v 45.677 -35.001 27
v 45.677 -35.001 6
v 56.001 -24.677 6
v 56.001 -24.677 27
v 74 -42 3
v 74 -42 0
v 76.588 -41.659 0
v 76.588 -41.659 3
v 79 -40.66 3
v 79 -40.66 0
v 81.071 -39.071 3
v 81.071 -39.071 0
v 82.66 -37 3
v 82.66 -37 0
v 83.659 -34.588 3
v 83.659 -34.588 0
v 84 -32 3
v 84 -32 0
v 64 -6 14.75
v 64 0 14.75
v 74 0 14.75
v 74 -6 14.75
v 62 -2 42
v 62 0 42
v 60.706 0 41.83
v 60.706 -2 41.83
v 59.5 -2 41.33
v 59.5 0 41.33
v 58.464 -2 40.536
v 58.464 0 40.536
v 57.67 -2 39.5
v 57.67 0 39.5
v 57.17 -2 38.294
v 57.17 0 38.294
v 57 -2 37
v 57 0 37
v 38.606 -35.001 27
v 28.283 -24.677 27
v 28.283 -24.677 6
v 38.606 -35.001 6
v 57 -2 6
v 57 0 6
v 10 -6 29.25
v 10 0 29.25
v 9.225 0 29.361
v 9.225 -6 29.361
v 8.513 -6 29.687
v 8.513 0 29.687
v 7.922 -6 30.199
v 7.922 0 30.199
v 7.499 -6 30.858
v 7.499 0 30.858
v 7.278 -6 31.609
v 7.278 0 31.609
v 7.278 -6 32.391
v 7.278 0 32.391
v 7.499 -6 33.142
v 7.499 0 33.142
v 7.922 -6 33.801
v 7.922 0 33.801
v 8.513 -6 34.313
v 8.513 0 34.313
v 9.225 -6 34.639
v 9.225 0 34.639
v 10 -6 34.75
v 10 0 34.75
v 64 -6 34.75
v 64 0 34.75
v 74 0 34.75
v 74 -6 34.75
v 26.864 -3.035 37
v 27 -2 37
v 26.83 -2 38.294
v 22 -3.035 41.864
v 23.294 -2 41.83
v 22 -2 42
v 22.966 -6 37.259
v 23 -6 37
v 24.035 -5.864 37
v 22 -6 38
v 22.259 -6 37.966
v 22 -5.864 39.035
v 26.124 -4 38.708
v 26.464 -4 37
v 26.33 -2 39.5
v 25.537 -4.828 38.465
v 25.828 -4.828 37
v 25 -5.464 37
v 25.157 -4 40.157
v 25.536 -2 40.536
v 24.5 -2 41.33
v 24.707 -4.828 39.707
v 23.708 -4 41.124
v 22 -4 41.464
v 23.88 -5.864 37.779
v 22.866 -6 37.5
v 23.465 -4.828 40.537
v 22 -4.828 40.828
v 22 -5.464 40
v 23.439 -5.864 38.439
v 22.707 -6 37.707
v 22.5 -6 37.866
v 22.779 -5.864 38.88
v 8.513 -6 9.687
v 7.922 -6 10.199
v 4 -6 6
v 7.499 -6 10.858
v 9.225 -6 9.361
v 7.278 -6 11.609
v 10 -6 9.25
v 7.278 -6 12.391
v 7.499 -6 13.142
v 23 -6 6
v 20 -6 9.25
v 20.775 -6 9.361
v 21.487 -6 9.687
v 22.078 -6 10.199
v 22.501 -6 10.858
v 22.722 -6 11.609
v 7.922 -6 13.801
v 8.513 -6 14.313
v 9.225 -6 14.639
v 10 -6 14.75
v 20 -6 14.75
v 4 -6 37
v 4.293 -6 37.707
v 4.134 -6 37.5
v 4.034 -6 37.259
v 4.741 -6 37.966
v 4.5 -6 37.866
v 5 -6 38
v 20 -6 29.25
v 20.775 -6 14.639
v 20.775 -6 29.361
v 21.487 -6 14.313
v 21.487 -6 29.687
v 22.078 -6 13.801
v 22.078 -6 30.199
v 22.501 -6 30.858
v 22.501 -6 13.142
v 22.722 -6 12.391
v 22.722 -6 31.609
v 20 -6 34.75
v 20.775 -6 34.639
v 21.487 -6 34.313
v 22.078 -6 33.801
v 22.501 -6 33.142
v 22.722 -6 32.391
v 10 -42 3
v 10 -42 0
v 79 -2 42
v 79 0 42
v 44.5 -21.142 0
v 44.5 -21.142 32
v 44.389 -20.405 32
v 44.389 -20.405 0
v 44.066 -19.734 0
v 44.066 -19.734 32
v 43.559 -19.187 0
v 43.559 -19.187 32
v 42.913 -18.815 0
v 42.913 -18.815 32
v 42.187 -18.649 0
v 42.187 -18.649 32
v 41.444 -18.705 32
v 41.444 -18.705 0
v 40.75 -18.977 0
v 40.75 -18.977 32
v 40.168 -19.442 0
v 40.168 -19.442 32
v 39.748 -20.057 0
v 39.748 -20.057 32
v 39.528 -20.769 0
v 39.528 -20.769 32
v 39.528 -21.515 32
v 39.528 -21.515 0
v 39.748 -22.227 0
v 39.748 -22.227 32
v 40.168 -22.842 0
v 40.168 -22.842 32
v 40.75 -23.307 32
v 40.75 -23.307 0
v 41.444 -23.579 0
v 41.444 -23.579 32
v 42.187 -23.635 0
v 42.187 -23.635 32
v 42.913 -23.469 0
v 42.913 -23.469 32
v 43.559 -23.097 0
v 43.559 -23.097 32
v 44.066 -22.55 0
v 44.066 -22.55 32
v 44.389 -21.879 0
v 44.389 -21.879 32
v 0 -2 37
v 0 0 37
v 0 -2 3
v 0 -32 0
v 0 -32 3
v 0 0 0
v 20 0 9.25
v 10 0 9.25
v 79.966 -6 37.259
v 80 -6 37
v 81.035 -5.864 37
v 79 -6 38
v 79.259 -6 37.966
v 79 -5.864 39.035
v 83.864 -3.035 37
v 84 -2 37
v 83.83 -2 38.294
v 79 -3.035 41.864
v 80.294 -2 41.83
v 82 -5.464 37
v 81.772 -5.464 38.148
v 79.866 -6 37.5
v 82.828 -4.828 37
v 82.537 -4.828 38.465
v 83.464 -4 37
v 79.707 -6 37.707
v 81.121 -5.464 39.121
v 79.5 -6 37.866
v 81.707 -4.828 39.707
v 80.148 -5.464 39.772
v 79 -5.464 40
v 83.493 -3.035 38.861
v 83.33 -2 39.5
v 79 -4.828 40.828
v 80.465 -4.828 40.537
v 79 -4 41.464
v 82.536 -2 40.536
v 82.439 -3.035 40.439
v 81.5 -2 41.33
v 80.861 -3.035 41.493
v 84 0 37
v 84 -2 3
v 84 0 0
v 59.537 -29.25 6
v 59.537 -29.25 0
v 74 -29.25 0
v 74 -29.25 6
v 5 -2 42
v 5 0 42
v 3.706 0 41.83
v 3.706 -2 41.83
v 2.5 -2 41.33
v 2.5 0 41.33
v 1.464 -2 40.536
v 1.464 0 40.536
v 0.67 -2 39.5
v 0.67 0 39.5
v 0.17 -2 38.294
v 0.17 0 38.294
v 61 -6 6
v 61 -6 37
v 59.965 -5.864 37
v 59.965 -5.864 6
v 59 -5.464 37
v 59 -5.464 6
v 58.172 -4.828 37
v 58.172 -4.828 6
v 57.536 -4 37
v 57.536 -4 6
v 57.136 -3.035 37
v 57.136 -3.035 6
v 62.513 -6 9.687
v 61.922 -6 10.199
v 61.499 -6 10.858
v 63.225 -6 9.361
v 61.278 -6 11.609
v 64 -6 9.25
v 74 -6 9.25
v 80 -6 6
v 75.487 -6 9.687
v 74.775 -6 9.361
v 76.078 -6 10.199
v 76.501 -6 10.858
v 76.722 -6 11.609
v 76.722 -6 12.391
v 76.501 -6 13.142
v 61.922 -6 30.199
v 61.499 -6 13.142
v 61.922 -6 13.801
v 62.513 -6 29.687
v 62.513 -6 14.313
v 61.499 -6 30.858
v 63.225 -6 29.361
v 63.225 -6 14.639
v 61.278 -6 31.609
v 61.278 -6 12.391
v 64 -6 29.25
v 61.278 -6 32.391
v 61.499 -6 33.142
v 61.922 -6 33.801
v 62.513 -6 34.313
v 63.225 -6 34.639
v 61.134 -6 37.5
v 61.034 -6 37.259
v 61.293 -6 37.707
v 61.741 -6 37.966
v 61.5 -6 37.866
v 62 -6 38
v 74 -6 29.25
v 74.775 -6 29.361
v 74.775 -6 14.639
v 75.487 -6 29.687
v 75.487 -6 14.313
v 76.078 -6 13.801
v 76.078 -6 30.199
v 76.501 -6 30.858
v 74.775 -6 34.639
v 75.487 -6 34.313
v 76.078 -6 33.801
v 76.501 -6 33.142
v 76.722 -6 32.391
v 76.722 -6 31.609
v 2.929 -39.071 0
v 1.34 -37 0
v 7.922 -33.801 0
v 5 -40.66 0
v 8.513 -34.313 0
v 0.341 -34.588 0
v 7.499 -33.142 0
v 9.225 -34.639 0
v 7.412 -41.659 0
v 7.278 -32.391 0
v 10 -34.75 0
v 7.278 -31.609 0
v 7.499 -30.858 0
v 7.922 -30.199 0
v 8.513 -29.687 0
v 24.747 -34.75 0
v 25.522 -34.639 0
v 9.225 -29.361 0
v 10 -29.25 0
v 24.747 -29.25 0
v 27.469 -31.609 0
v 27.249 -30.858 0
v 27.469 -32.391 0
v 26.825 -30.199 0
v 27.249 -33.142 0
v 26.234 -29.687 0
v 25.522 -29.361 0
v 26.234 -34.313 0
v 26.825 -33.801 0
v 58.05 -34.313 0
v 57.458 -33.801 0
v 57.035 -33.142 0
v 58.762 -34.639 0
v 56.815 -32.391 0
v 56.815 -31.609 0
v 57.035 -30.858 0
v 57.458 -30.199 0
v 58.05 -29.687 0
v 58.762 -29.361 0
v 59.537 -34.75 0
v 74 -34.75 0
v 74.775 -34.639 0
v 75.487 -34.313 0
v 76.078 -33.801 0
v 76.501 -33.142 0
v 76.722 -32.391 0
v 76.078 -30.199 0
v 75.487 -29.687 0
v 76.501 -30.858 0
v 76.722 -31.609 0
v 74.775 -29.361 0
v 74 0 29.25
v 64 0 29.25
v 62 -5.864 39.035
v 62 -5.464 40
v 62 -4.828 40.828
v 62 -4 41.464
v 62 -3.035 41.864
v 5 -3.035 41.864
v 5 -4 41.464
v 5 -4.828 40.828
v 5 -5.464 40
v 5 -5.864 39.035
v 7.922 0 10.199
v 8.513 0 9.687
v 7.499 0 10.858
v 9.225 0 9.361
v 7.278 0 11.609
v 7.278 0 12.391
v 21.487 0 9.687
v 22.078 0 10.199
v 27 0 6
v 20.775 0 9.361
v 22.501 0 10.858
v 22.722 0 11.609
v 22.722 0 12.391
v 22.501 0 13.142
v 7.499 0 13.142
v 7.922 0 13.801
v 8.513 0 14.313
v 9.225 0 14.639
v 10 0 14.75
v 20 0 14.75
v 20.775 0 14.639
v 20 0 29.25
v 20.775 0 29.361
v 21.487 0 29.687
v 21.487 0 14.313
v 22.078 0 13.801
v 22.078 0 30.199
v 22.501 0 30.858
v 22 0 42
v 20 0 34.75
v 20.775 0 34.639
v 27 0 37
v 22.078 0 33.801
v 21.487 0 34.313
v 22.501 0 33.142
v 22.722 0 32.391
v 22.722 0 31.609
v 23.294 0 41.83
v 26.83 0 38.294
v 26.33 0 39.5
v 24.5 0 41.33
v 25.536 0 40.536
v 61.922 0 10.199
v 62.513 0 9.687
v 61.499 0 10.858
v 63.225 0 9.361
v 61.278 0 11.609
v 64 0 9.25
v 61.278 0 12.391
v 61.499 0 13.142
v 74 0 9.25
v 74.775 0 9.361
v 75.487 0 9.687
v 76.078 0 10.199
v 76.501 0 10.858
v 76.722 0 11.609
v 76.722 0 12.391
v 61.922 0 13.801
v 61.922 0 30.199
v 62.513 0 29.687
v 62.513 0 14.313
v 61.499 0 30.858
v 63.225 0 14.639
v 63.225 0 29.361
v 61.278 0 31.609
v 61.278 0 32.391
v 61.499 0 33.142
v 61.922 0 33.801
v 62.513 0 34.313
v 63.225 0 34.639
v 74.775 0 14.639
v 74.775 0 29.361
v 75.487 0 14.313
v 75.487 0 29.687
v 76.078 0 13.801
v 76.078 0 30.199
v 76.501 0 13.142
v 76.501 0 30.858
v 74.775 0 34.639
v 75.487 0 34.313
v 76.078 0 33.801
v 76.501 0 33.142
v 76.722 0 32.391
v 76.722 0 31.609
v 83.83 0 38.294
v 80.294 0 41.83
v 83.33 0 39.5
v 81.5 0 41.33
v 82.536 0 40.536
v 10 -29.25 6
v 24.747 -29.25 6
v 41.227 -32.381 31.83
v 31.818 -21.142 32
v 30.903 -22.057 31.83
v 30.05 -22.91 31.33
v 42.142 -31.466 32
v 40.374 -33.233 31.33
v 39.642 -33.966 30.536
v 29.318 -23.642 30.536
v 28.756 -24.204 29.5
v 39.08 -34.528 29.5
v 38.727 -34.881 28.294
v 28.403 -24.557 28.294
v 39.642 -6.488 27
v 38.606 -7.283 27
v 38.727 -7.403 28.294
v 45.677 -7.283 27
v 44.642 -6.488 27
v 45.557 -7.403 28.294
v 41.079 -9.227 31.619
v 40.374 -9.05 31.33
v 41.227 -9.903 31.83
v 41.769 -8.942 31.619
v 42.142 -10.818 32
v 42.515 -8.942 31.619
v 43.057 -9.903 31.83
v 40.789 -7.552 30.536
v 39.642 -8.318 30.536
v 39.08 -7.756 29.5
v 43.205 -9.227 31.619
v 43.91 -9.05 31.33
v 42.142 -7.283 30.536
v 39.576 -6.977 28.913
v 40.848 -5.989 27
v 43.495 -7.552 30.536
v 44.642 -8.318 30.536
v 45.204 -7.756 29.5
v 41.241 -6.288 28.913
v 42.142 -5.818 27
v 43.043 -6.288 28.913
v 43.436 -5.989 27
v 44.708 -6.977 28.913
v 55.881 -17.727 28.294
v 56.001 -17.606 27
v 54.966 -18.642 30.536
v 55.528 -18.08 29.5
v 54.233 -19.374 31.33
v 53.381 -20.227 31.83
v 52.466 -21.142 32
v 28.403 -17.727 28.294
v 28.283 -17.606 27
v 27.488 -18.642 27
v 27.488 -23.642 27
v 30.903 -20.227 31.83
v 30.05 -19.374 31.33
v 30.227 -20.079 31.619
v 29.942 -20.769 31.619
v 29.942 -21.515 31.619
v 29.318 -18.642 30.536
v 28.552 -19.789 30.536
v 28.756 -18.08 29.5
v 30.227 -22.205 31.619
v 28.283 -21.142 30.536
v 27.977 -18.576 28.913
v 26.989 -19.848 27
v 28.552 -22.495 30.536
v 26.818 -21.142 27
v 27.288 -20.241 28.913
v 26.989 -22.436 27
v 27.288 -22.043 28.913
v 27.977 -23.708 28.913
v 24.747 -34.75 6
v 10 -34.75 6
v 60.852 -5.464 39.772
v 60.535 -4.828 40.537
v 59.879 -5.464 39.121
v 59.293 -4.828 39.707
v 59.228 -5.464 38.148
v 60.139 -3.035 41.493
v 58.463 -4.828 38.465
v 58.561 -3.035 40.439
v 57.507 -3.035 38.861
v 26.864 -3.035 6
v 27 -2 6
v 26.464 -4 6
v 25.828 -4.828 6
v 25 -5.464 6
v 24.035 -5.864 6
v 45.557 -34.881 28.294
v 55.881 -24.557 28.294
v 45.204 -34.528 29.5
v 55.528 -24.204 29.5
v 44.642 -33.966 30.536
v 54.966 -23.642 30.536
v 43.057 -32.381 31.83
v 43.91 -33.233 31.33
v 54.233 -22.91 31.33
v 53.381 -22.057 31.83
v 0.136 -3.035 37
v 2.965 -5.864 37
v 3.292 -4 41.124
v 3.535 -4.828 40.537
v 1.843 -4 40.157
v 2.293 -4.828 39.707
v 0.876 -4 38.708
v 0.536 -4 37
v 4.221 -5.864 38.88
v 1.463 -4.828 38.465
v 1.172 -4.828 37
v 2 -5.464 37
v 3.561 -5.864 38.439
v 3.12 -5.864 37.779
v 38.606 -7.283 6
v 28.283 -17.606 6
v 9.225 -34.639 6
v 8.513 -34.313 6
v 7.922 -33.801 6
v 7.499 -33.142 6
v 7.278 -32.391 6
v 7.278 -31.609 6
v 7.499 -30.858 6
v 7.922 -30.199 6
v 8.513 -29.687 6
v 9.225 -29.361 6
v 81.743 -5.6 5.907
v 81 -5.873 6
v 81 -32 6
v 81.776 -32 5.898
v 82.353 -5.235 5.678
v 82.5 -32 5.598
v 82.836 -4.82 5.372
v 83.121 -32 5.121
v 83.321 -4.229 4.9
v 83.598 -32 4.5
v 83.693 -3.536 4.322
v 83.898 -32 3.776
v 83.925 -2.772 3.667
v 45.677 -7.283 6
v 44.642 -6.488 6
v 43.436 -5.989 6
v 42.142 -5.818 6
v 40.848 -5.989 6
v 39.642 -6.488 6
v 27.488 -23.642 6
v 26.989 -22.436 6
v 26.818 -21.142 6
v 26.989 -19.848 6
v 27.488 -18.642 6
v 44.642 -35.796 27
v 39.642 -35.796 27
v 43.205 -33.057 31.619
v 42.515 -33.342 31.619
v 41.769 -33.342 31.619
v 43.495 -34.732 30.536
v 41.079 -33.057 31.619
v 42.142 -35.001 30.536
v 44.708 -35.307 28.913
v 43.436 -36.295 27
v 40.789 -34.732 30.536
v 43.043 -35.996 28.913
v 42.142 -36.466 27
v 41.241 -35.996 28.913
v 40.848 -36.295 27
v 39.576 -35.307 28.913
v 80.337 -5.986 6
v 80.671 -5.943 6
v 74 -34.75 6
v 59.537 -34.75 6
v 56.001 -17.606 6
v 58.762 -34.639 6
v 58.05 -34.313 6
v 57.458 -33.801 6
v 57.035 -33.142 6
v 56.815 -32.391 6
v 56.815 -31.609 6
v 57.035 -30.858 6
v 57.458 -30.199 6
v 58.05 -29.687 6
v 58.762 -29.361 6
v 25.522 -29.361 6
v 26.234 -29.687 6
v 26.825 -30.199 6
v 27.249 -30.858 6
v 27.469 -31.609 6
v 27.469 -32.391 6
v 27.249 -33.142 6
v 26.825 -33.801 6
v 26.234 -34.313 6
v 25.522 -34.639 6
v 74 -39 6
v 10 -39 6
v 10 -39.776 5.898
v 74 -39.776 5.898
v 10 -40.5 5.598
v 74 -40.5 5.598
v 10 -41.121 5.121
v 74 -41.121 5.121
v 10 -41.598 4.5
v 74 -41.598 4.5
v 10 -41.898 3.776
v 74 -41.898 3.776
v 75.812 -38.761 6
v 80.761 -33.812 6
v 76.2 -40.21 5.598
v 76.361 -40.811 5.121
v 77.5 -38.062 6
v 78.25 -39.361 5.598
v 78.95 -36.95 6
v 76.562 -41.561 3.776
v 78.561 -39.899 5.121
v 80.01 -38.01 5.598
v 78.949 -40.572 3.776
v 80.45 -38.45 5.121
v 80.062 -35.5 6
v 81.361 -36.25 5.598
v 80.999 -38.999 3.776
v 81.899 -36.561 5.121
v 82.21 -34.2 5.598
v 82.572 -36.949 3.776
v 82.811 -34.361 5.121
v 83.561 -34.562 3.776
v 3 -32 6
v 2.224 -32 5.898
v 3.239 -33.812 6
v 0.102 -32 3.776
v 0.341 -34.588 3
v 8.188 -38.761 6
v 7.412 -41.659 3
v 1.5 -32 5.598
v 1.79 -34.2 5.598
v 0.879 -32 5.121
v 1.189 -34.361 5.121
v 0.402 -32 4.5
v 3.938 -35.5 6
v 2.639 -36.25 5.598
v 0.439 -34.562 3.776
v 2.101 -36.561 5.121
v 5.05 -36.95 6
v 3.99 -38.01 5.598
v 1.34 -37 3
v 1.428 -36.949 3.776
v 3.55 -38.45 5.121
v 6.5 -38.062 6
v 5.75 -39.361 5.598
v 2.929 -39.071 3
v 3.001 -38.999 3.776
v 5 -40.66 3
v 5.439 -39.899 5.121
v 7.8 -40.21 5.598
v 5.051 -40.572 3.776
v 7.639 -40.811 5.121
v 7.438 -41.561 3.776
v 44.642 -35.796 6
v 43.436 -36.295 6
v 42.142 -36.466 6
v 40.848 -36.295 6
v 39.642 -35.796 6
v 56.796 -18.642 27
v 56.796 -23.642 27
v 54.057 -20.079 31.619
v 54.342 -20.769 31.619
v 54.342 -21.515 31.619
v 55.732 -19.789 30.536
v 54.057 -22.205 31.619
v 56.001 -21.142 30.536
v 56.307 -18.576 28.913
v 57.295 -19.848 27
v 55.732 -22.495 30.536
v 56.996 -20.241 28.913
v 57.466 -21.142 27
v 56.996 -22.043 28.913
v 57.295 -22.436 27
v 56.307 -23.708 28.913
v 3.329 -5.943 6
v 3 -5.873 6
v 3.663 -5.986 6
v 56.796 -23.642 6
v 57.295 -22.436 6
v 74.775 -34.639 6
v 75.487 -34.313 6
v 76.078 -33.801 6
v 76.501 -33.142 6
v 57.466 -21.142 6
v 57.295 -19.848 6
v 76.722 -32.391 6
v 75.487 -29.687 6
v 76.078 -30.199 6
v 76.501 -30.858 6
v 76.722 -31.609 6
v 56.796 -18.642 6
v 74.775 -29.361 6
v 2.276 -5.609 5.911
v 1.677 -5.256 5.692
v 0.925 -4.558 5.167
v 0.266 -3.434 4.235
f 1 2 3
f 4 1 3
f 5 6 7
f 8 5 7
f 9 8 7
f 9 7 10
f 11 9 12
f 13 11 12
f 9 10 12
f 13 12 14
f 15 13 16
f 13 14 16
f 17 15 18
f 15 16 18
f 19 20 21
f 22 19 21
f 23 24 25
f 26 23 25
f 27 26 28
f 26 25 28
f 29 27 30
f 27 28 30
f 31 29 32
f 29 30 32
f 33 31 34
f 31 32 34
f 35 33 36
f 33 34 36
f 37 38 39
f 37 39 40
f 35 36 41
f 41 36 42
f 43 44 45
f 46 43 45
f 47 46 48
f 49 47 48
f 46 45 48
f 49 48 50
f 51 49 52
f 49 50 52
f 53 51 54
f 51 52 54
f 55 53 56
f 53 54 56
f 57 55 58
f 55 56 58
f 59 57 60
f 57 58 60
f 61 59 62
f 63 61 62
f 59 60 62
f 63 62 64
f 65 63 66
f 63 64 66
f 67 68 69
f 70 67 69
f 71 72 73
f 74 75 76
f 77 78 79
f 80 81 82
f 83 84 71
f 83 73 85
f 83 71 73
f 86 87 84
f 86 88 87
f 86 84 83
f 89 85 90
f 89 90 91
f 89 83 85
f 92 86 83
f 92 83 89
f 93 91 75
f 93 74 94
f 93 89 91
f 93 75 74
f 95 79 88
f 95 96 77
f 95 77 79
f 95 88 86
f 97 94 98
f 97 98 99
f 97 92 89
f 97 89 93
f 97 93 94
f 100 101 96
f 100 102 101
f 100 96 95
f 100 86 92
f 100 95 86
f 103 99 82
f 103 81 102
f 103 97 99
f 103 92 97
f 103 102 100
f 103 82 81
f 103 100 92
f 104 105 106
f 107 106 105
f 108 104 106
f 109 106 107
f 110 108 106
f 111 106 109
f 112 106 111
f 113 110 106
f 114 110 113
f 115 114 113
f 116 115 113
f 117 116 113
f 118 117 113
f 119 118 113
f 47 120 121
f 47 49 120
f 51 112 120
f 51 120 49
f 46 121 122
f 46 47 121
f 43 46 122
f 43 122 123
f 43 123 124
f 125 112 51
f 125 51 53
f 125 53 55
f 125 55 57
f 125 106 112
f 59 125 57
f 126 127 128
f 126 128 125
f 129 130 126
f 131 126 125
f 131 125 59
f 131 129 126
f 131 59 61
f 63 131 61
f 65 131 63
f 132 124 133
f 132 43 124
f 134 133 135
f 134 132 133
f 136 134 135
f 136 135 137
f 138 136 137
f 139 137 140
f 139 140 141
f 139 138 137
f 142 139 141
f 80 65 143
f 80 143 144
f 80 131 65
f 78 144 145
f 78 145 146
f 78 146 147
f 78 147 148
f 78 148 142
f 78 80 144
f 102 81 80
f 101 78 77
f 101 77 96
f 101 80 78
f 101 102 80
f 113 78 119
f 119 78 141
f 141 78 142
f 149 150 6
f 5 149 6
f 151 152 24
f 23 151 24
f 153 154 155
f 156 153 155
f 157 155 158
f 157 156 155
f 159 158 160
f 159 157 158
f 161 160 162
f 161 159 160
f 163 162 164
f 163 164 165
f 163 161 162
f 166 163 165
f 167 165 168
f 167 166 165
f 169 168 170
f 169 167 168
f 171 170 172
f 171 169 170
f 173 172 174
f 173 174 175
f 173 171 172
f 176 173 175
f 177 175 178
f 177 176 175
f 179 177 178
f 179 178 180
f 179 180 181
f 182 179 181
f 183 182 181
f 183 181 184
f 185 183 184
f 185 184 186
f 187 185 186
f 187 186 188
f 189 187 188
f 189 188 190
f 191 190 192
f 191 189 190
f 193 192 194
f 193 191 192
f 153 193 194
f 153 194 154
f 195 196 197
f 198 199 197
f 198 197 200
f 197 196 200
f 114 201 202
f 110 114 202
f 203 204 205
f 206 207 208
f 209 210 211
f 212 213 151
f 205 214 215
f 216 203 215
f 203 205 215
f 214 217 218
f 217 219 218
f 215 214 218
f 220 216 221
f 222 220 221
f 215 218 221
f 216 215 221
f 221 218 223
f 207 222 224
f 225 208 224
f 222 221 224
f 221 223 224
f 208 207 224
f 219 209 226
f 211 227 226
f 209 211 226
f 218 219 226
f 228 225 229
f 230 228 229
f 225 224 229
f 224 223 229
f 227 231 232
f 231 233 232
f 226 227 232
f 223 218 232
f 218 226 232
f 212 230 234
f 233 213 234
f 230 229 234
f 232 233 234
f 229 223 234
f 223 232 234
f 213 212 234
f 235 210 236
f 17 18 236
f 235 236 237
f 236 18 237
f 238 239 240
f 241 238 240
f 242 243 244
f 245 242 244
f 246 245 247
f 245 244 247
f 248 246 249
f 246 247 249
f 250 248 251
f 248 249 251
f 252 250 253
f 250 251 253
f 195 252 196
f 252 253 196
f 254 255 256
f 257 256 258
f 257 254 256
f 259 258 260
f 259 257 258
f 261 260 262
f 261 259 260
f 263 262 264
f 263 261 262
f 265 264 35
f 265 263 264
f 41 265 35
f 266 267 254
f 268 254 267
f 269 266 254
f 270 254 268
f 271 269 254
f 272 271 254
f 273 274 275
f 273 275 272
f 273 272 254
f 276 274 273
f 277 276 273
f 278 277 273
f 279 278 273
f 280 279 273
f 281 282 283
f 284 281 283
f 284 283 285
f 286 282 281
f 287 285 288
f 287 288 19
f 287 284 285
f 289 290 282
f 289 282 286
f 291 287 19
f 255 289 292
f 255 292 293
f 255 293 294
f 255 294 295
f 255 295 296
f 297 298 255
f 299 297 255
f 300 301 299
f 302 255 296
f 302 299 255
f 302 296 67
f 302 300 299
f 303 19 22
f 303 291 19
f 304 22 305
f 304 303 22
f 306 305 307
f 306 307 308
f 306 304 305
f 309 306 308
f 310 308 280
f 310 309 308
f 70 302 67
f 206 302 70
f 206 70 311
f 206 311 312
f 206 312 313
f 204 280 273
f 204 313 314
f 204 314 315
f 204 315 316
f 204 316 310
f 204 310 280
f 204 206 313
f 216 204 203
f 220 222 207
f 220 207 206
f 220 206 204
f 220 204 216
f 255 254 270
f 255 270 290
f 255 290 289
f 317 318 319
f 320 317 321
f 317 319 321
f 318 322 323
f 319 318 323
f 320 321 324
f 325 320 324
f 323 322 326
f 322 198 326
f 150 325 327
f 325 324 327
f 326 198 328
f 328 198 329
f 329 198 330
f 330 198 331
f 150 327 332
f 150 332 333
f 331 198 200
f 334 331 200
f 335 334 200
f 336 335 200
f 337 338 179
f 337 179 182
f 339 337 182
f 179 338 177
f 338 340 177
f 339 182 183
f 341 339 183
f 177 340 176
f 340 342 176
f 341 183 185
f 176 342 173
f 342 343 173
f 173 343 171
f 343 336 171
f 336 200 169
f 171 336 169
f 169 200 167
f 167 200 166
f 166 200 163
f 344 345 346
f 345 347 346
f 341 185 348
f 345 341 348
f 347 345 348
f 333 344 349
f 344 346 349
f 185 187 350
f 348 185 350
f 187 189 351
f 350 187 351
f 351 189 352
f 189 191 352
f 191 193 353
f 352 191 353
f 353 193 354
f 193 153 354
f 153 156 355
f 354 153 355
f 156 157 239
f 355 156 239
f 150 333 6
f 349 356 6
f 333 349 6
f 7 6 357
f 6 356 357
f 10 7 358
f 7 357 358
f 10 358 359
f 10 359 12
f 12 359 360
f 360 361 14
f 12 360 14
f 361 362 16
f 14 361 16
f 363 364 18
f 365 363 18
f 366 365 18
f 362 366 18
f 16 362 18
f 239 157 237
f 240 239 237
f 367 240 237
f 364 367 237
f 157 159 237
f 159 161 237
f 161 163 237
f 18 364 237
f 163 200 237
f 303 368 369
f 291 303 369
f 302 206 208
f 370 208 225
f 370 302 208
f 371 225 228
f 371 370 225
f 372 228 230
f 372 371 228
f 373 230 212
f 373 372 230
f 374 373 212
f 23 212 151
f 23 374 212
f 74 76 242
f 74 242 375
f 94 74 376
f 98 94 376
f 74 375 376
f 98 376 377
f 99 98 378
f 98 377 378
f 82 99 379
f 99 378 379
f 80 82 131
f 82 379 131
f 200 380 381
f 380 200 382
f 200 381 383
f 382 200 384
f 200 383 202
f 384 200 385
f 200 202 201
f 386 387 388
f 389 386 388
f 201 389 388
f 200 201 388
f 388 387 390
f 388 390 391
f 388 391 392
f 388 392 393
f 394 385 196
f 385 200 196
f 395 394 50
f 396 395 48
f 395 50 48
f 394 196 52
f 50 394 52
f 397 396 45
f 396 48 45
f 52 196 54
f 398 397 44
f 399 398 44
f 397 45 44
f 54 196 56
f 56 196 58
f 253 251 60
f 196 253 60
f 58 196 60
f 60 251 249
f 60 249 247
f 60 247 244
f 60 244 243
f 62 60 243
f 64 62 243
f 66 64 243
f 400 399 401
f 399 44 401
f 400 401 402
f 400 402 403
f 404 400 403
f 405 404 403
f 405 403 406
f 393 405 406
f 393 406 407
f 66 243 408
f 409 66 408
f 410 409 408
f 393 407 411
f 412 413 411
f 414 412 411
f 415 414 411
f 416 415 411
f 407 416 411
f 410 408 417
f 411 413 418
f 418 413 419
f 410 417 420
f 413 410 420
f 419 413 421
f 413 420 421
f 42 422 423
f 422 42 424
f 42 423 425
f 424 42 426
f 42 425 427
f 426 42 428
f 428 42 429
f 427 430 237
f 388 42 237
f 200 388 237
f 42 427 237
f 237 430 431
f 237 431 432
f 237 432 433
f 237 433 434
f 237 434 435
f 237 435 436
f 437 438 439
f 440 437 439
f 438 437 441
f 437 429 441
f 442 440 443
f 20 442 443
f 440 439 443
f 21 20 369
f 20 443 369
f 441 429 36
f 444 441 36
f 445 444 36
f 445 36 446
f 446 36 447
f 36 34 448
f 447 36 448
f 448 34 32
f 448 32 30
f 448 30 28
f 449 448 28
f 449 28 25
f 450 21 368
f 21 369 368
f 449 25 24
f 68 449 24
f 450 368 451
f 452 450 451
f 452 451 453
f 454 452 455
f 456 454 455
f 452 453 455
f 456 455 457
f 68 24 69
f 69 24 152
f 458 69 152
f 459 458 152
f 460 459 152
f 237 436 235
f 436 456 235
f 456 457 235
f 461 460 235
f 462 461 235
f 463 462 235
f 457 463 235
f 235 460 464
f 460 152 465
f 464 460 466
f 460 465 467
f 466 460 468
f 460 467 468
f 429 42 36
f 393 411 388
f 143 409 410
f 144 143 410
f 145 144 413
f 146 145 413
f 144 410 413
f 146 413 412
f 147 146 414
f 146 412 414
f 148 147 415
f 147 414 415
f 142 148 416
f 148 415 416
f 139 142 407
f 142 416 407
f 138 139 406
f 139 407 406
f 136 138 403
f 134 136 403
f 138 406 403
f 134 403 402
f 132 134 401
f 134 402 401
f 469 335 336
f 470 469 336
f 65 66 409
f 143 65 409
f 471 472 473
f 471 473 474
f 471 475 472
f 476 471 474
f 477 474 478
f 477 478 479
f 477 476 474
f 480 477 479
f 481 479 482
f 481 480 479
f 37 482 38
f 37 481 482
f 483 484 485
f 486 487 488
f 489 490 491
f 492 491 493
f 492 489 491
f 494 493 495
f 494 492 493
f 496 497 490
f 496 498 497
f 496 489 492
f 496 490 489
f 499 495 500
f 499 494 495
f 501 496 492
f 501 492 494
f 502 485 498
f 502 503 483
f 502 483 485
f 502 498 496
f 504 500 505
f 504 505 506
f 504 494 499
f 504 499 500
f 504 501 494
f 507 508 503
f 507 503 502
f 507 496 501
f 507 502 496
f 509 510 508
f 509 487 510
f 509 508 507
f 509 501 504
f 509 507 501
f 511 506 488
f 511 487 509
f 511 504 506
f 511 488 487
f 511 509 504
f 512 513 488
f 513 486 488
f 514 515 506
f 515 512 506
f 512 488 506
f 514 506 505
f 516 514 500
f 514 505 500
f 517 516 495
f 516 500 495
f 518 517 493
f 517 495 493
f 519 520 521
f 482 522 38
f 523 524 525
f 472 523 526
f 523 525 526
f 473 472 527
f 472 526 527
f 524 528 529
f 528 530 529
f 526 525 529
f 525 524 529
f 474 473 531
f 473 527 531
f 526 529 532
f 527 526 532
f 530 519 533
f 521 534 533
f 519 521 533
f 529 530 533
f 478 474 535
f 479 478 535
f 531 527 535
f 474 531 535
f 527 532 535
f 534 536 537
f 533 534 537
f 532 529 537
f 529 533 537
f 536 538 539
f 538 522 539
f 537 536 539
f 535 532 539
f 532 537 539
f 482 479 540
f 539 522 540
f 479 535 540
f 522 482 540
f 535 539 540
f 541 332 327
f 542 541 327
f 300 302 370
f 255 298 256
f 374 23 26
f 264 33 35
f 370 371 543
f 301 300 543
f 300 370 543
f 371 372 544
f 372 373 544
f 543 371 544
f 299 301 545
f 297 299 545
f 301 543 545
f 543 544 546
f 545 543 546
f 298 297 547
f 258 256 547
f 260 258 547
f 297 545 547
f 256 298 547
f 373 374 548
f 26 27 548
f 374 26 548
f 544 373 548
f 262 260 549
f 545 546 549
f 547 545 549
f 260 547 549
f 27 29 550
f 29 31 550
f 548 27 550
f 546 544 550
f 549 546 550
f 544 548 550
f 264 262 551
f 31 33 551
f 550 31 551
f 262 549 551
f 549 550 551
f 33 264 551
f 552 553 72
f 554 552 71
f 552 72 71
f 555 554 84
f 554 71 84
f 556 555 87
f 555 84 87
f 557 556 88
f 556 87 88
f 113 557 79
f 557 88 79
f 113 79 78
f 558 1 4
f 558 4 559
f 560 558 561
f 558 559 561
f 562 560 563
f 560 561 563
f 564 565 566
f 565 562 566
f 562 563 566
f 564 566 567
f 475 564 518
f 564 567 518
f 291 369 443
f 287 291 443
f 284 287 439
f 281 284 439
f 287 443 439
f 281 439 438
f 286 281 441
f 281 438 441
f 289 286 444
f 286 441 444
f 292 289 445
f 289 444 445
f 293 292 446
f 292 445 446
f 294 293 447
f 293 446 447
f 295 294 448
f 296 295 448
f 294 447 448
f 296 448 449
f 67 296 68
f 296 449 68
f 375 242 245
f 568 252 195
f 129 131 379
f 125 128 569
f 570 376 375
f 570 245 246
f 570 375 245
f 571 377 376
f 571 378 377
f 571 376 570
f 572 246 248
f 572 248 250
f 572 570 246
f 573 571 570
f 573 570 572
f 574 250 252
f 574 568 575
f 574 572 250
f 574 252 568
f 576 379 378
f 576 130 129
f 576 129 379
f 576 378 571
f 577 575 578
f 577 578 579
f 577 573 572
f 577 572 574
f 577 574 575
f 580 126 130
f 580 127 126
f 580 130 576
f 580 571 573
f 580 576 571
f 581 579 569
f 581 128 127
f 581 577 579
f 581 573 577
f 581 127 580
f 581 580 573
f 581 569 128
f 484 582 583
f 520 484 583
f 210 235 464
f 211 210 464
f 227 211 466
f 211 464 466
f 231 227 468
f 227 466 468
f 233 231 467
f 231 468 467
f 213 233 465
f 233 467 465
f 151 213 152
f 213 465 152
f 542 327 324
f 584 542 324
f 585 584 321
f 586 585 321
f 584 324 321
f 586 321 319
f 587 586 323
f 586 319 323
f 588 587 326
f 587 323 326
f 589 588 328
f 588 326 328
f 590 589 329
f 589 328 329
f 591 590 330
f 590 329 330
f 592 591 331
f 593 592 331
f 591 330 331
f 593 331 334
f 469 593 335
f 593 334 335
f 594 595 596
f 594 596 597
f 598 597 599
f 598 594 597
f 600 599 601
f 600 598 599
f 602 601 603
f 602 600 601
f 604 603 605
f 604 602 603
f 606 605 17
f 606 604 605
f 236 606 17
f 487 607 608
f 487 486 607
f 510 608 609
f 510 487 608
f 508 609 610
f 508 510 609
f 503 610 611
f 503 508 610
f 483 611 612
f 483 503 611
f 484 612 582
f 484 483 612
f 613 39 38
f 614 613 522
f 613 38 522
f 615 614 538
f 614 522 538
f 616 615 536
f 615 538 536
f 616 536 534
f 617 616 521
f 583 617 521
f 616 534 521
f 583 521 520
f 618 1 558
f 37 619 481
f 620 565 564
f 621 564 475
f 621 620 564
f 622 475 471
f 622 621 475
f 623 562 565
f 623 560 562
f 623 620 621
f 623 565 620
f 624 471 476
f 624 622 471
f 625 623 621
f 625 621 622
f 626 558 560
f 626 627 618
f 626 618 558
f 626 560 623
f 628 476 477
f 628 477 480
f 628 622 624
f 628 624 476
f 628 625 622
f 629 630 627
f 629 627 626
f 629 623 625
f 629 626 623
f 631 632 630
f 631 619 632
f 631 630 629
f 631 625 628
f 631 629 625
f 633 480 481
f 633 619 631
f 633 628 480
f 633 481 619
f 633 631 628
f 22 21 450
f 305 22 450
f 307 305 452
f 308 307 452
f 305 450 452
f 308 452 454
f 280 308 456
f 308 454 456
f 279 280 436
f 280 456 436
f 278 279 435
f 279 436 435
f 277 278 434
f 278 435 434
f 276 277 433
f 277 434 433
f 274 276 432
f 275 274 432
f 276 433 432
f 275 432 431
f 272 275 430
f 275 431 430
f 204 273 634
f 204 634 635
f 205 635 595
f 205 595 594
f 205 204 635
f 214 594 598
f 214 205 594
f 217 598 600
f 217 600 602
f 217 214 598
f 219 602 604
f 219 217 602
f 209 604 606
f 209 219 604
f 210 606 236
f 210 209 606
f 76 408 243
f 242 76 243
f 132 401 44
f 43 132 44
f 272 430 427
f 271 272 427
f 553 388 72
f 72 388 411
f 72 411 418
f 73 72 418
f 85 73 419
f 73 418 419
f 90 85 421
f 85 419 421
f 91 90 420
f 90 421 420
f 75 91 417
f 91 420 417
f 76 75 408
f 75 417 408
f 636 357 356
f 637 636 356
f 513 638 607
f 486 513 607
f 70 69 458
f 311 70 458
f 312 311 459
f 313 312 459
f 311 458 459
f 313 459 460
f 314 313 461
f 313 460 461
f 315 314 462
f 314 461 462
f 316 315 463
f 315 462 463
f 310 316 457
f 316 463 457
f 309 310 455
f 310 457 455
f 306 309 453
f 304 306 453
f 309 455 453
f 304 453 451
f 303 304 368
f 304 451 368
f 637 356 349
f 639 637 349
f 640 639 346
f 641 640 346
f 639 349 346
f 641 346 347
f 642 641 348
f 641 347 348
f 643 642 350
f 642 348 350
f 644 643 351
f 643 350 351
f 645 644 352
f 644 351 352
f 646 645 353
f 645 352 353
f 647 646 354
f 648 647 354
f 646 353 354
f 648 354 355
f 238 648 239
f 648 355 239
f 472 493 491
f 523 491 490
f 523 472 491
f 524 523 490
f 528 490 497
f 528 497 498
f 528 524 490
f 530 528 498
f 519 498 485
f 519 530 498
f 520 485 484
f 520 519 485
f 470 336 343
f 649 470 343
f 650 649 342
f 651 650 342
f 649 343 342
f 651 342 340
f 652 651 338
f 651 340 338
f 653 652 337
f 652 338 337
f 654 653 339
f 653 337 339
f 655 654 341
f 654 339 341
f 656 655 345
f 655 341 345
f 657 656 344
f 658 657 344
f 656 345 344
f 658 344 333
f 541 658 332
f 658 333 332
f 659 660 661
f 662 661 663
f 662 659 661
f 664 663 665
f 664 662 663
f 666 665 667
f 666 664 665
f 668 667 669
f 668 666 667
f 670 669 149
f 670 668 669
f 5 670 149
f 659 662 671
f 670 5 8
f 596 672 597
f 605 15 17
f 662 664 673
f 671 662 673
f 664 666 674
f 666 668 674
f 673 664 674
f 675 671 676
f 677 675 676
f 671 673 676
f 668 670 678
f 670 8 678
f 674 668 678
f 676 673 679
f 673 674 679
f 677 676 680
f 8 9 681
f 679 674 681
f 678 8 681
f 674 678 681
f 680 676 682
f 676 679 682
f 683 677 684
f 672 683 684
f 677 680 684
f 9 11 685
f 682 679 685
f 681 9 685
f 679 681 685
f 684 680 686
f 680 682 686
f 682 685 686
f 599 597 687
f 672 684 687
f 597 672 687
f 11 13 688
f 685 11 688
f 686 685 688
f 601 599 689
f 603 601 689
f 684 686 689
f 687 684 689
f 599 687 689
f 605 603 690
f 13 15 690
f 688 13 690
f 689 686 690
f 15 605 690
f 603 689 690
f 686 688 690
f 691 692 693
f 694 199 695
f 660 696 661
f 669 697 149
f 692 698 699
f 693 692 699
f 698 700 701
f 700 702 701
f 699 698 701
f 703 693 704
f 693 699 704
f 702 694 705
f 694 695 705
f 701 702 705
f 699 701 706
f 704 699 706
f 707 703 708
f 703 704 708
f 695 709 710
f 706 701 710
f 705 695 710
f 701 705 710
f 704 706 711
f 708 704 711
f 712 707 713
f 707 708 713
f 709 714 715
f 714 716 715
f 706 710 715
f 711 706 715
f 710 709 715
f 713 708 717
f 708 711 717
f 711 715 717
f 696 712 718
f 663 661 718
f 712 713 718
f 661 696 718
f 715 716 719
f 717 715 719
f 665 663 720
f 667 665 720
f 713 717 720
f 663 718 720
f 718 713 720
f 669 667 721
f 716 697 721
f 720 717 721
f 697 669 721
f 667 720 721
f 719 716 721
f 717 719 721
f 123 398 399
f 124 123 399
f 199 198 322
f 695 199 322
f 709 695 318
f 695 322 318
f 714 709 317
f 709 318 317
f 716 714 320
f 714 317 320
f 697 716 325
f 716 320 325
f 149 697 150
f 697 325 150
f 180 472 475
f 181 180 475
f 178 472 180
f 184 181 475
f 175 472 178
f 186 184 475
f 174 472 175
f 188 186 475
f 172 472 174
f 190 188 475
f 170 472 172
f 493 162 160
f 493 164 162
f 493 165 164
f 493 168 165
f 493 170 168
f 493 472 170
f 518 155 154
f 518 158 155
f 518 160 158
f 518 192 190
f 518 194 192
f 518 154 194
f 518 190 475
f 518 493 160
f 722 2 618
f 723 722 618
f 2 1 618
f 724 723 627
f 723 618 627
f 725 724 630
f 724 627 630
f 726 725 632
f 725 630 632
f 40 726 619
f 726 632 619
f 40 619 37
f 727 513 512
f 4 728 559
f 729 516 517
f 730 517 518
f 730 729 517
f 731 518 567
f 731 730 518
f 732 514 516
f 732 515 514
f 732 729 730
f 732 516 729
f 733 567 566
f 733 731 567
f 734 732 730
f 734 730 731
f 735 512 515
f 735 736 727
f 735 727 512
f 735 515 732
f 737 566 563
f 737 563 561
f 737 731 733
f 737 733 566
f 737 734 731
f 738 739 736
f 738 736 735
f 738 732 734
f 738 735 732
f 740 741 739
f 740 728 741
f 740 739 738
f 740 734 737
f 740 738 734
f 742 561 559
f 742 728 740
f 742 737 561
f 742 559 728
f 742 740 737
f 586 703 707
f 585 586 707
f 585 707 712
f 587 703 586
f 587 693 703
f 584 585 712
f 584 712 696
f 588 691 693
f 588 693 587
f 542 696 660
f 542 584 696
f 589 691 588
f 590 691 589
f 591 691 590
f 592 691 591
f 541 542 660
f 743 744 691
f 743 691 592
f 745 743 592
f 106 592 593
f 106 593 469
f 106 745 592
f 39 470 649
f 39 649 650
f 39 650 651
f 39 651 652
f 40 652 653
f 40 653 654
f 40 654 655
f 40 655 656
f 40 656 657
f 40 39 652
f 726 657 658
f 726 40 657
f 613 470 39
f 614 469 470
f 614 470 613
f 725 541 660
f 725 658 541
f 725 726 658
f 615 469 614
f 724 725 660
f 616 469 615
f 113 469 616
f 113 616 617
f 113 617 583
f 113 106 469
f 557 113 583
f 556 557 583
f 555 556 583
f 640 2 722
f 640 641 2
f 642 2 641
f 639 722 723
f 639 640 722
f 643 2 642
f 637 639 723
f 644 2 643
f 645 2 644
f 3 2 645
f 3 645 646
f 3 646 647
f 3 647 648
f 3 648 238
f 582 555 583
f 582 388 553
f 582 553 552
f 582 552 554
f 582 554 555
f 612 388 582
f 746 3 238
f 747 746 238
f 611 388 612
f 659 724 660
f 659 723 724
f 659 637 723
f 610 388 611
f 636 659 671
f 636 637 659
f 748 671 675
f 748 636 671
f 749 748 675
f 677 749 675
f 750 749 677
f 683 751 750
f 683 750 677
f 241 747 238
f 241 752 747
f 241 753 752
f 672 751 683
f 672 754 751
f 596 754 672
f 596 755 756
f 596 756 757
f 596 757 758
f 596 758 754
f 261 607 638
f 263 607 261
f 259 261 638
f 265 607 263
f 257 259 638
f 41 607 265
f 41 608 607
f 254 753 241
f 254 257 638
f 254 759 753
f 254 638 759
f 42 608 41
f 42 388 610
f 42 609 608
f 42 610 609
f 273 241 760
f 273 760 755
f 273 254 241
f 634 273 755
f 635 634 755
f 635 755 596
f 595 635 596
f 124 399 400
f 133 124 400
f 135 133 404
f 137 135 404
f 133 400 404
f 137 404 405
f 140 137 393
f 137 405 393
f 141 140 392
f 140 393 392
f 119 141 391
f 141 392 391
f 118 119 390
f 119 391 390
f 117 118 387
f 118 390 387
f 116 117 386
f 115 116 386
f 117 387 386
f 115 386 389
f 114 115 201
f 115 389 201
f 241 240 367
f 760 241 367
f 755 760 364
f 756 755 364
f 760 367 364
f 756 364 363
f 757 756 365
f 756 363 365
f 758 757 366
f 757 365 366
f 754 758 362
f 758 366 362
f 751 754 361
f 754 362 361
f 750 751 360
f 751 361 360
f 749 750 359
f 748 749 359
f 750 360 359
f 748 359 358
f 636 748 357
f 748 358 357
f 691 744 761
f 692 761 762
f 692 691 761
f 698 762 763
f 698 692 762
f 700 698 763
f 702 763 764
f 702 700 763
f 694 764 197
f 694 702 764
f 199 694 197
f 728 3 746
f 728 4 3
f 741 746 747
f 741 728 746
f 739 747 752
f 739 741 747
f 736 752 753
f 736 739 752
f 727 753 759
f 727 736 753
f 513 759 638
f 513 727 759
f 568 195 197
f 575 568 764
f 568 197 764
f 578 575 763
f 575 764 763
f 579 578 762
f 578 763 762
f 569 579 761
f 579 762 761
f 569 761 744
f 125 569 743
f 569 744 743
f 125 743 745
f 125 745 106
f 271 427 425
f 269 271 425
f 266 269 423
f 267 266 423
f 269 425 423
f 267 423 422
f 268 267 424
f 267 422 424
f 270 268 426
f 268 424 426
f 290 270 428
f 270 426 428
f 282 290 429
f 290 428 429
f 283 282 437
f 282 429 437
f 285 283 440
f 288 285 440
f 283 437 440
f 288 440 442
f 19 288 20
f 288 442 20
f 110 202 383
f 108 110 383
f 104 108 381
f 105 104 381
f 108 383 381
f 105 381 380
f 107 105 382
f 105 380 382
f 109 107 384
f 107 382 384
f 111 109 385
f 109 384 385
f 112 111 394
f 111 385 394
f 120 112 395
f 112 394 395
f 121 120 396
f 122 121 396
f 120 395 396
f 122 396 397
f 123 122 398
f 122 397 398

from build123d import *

# Parameters (mm, degrees)
F1_DEPTH = 6
F0_R     = 2.5
F2_DEPTH = 32
F3_R     = 5
F4_R     = 3
F6_DEPTH = 6
F7_R     = 4


with BuildPart() as f1:
    # F0 (on Top) → F1 (new body)
    with BuildSketch(Plane.XY):
        with BuildLine():
            Line((84, 0), (0, 0))
            Line((0, 0), (0, -32))
            ThreePointArc((0, -32), (2.928932, -39.071068), (10, -42))
            Line((10, -42), (74, -42))
            ThreePointArc((74, -42), (81.071068, -39.071068), (84, -32))
            Line((84, -32), (84, 0))
        make_face()
        with BuildLine():
            ThreePointArc((10, -34.75), (7.25, -32), (10, -29.25))
            Line((10, -29.25), (24.74713, -29.25))
            ThreePointArc((24.74713, -29.25), (27.49713, -32), (24.74713, -34.75))
            Line((24.74713, -34.75), (10, -34.75))
        make_face(mode=Mode.SUBTRACT)
        with BuildLine():
            ThreePointArc((59.536784, -34.75), (56.786784, -32), (59.536784, -29.25))
            Line((59.536784, -29.25), (74, -29.25))
            ThreePointArc((74, -29.25), (76.75, -32), (74, -34.75))
            Line((74, -34.75), (59.536784, -34.75))
        make_face(mode=Mode.SUBTRACT)
        Polygon((42.141957, -3.74713), (59.536784, -21.141957), (42.141957, -38.536784), (24.74713, -21.141957), align=None, mode=Mode.SUBTRACT)
    extrude(amount=F1_DEPTH)

    # F0 (on Top) → F2 (join)
    with BuildSketch(Plane.XY):
        Polygon((42.141957, -38.536784), (59.536784, -21.141957), (42.141957, -3.74713), (24.74713, -21.141957), align=None)
        with Locations((42.00013, -21.141957)):
            Circle(F0_R, mode=Mode.SUBTRACT)
    extrude(amount=F2_DEPTH)

    # F3
    f3_edges = [f1.edges().sort_by_distance(p)[0] for p in [
        (42.141957, -38.536784, 19),
        (24.74713, -21.141957, 19),
        (59.536784, -21.141957, 19),
        (42.141957, -3.74713, 19),
        (33.444544, -12.444544, 32),
        (50.83937, -12.444544, 32),
        (50.83937, -29.83937, 32),
        (33.444544, -29.83937, 32),
    ]]
    fillet(f3_edges, radius=F3_R)

    # F4
    f4_edges = [f1.edges().sort_by_distance(p)[0] for p in [
        (42, -42, 6),
    ]]
    fillet(f4_edges, radius=F4_R)

    # F5 (on Front) → F6 (join)
    with BuildSketch(Plane.XZ):
        with BuildLine():
            Line((0, 37), (0, 0))
            Line((0, 0), (27, 0))
            Line((27, 0), (27, 37))
            ThreePointArc((27, 37), (25.535534, 40.535534), (22, 42))
            Line((22, 42), (5, 42))
            ThreePointArc((5, 42), (1.464466, 40.535534), (0, 37))
        make_face()
        with BuildLine():
            ThreePointArc((10, 9.25), (7.25, 12), (10, 14.75))
            Line((10, 14.75), (20, 14.75))
            ThreePointArc((20, 14.75), (22.75, 12), (20, 9.25))
            Line((20, 9.25), (10, 9.25))
        make_face(mode=Mode.SUBTRACT)
        with BuildLine():
            ThreePointArc((20, 34.75), (22.75, 32), (20, 29.25))
            Line((20, 29.25), (10, 29.25))
            ThreePointArc((10, 29.25), (7.25, 32), (10, 34.75))
            Line((10, 34.75), (20, 34.75))
        make_face(mode=Mode.SUBTRACT)
        with BuildLine():
            Line((84, 0), (84, 37))
            ThreePointArc((84, 37), (82.535534, 40.535534), (79, 42))
            Line((79, 42), (62, 42))
            ThreePointArc((62, 42), (58.464466, 40.535534), (57, 37))
            Line((57, 37), (57, 0))
            Line((57, 0), (84, 0))
        make_face()
        with BuildLine():
            ThreePointArc((64, 9.25), (61.25, 12), (64, 14.75))
            Line((64, 14.75), (74, 14.75))
            ThreePointArc((74, 14.75), (76.75, 12), (74, 9.25))
            Line((74, 9.25), (64, 9.25))
        make_face(mode=Mode.SUBTRACT)
        with BuildLine():
            ThreePointArc((64, 29.25), (61.25, 32), (64, 34.75))
            Line((64, 34.75), (74, 34.75))
            ThreePointArc((74, 34.75), (76.75, 32), (74, 29.25))
            Line((74, 29.25), (64, 29.25))
        make_face(mode=Mode.SUBTRACT)
    extrude(amount=F6_DEPTH)

    # F7
    f7_edges = [f1.edges().sort_by_distance(p)[0] for p in [
        (0, -6, 20),
        (84, -6, 20),
    ]]
    fillet(f7_edges, radius=F7_R)


solid = f1.part
